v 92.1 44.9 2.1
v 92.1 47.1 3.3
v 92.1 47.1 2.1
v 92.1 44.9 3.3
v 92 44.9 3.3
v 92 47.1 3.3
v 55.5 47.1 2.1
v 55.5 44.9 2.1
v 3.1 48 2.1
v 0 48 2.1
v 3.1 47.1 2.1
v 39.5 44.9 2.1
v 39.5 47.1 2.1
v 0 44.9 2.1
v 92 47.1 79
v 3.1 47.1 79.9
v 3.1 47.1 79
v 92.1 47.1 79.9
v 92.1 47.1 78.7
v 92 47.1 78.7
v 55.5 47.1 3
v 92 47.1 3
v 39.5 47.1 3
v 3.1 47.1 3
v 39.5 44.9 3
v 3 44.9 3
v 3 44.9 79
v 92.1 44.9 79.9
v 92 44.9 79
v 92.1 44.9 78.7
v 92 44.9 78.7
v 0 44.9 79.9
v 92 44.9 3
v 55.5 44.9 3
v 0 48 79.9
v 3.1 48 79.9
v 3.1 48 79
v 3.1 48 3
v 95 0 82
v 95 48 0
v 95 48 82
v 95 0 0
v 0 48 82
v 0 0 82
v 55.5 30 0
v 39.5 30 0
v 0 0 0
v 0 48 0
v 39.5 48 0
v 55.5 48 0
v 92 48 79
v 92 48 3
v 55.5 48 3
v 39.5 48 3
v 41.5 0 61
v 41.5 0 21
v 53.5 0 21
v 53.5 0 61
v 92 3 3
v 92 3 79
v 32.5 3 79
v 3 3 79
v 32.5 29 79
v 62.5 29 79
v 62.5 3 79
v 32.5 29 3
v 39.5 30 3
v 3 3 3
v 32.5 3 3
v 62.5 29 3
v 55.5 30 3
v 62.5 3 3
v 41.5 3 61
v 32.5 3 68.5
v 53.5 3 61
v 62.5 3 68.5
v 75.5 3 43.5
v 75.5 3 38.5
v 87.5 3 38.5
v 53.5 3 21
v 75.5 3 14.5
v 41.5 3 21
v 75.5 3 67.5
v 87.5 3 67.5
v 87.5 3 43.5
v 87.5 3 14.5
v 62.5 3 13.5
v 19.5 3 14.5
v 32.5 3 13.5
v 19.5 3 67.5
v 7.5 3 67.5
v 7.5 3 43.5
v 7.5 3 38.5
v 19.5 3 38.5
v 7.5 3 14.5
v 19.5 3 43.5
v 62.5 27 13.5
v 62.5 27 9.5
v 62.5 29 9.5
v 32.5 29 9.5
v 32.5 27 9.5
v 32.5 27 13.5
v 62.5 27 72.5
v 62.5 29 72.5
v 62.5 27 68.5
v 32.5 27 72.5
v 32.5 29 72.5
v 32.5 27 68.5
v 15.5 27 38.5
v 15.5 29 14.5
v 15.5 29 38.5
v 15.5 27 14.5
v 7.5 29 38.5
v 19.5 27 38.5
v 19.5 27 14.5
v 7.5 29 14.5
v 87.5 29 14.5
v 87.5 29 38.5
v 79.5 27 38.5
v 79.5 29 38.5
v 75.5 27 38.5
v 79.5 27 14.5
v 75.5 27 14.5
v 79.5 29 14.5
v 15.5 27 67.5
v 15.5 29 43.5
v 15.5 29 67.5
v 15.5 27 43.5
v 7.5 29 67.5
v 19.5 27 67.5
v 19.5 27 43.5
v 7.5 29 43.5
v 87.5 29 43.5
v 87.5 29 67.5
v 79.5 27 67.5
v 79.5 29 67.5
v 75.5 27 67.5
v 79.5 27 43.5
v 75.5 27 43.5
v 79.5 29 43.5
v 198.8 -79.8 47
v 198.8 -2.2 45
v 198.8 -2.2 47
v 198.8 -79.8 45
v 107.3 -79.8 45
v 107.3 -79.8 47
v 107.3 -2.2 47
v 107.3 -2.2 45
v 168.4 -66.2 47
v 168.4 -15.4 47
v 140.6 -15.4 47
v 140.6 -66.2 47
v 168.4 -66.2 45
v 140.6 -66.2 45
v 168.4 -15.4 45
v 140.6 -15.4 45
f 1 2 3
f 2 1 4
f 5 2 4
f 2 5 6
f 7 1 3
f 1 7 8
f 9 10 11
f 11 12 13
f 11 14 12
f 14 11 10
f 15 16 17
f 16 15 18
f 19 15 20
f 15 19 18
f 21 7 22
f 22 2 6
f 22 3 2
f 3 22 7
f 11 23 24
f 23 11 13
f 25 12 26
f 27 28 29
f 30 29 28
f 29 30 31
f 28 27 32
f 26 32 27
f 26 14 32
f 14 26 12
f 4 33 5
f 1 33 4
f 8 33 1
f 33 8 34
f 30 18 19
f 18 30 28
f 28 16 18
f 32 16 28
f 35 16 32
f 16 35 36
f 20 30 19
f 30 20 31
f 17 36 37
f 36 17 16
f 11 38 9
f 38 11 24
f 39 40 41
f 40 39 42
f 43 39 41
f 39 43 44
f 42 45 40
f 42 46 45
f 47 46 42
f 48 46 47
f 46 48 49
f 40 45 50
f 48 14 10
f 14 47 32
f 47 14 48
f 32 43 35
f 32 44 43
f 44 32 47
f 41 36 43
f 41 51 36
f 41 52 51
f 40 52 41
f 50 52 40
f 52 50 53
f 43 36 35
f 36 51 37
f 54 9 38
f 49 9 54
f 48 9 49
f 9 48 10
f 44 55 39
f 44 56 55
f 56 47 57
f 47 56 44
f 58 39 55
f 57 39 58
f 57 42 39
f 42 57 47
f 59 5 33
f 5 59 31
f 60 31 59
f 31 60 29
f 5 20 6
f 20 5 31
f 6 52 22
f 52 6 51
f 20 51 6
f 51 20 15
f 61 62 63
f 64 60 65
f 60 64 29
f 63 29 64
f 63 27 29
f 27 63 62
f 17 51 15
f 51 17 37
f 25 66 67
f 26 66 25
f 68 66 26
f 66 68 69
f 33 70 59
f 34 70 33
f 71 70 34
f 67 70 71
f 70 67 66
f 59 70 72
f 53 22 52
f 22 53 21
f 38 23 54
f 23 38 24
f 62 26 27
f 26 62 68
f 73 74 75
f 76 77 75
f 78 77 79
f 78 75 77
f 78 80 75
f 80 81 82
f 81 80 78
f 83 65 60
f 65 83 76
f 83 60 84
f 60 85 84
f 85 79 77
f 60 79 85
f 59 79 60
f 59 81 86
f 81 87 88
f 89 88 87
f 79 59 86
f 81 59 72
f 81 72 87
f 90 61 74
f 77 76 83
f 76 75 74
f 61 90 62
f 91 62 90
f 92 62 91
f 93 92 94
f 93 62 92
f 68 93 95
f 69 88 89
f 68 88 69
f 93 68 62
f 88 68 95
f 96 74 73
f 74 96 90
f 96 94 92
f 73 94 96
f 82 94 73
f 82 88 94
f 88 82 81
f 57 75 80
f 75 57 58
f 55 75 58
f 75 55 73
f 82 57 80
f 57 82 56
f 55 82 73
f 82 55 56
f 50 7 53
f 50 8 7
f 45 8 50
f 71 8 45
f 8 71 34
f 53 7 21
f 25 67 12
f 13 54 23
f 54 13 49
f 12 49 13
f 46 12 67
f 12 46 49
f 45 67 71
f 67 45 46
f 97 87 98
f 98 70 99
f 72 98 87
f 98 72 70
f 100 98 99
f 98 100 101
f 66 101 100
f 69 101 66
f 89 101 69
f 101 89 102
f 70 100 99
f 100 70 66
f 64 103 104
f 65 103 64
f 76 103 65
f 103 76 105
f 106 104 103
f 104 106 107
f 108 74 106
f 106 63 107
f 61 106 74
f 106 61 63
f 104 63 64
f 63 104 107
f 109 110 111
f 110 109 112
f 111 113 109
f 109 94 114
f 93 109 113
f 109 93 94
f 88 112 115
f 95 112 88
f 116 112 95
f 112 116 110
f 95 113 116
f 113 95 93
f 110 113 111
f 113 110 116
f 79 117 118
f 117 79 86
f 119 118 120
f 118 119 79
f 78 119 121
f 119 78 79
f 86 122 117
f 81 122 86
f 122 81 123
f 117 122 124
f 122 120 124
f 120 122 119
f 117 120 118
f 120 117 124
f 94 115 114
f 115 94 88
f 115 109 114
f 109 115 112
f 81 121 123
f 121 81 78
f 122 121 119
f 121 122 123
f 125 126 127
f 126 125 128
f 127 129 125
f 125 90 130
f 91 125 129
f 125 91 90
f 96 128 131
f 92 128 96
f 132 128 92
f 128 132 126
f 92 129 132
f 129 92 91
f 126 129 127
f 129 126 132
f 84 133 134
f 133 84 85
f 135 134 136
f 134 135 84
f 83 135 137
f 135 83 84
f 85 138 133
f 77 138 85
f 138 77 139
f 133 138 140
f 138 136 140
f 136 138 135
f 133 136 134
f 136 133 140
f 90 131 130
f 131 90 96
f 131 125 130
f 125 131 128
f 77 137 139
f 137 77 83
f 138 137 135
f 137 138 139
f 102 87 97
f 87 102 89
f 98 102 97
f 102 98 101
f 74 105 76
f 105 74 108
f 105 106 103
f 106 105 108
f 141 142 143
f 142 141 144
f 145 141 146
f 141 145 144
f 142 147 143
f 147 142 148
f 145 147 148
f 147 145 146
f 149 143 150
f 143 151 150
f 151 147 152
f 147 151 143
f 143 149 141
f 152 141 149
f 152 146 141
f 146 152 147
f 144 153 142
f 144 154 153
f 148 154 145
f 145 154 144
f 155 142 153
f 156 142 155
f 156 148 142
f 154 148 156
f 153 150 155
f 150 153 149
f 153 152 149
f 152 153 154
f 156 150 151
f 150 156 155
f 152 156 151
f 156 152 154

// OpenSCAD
/* Separate electronics housing for the Pinewood U-frame.
   Y=0 is the flat glue face on the rear U-rail; +Y points outward.
   The 12 x 40 mm opening aligns with the cable entry in the mounting plate.
*/
$fn=36;
piece="print_layout"; // base | lid | print_layout | preview

// 95 mm: version for plug connectors and lateral cable space.
// Use 70 mm for silicone-wire-only wiring.
box_width=95;
box_height=82;
box_depth=48;
wall=3;

cable_width=12;
cable_height=40;
// Display is vertical with USB below it: 27 mm wide, 50 mm tall.
display_width=27.8;  // 0.4 mm clearance per side
display_height=50.8;
lid_thickness=2;
slide_clearance=0.25;
guide_depth=1;              // remaining outer lip of the C-groove
lid_fit_clearance=.2;       // extra clearance for PETG sliding fit
// Lid slides from left to right in integrated C-grooves.
lid_x=.2+lid_fit_clearance/2;
lid_width=box_width-wall-lid_x-.1-lid_fit_clearance/2;
lid_y=box_depth-lid_thickness-guide_depth;
lid_z=wall-.9+lid_fit_clearance/2;
lid_height=box_height-2*wall+1.8-lid_fit_clearance;

// Board position: 64 x 63 mm, USB on the lower edge.
board_width=64;
board_height=63;
board_stack=17.8;
board_x=(box_width-board_width)/2;
board_z=9.5;
// The board rear is high enough for terminal blocks below it. The tallest
// assembly has 0.3 mm clearance to the actual lid inner face
// (Y=box_depth-lid_thickness).
board_y=lid_y-board_stack-.3;

// The 50 x 27 mm display is 6.3 mm below the upper board edge.
display_x=board_x+(board_width-display_width)/2;
display_z=board_z+board_height-6.3-display_height;

// Six tall supports with 2 mm stepped seats: an outer rim protrudes 2 mm
// farther and a recessed 2 mm seat supports the board. The board is inserted
// centrally; the lid applies only light pressure. Six gaps remain for cables
// leading to the 12 x 40 mm pass-through.
module board_supports() {
  pad_depth=board_y-wall;
  overlap=4;       // 4 mm wide recessed board support
  seat_step=2;
  side_width=8;
  horizontal_width=30;
  side_height=24;

  // Top/bottom: raised 2 mm outer rim plus recessed support.
  for(z=[board_z-side_width,board_z+board_height]) {
    translate([board_x+(board_width-horizontal_width)/2,wall-.1,z])
      cube([horizontal_width,pad_depth+seat_step+.2,side_width]);
  }
  translate([board_x+(board_width-horizontal_width)/2,wall-.1,board_z])
    cube([horizontal_width,pad_depth+.2,overlap]);
  translate([board_x+(board_width-horizontal_width)/2,wall-.1,board_z+board_height-overlap])
    cube([horizontal_width,pad_depth+.2,overlap]);

  // Left/right: two stepped seats each, free center for cables.
  for(z=[board_z+5,board_z+board_height-side_height-5]) {
    translate([board_x-side_width,wall-.1,z])
      cube([side_width,pad_depth+seat_step+.2,side_height]);
    translate([board_x+board_width,wall-.1,z])
      cube([side_width,pad_depth+seat_step+.2,side_height]);
    translate([board_x,wall-.1,z]) cube([overlap,pad_depth+.2,side_height]);
    translate([board_x+board_width-overlap,wall-.1,z])
      cube([overlap,pad_depth+.2,side_height]);
  }
}

// True C-grooves within the 3 mm housing walls. The lid is 1 mm below the
// outer face and is guided along its top, bottom, and right edges.
module lid_channel_cuts() {
  channel_y=lid_y-.1;
  channel_h=lid_thickness+.2;
  // Lower and upper longitudinal grooves.
  translate([-.1,channel_y,lid_z-.1])
    cube([box_width-wall+.2,channel_h,1.2]);
  translate([-.1,channel_y,lid_z+lid_height-1.1])
    cube([box_width-wall+.2,channel_h,1.2]);
  // Right vertical groove; the solid right wall remains the end stop.
  translate([lid_x+lid_width-1.1,channel_y,lid_z-.1])
    cube([1.2,channel_h,lid_height+.2]);
  // Fully open the left entry: the outer lip on this side would otherwise form
  // a long, fragile bridge over the lid entry. The lid remains guided by the
  // top, bottom, and right C-grooves.
  translate([-.1,channel_y,lid_z-.1])
    cube([wall+.2,box_depth-channel_y+.2,lid_height+.2]);
}

module housing_base() {
  union() {
    difference() {
      cube([box_width,box_depth,box_height]);
      // Open outer side, closed by the lid after assembly.
      translate([wall,wall,wall])
        cube([box_width-2*wall,box_depth-wall+0.1,box_height-2*wall]);
      // Pass-through to the 12 x 40 mm cable entry in the U-frame.
      translate([(box_width-cable_width)/2,-.1,(box_height-cable_height)/2])
        cube([cable_width,wall+.2,cable_height]);
      // USB access from below, centered and open towards the outside.
      translate([box_width/2-8,box_depth-18,-.1]) cube([16,18,wall+.2]);
      lid_channel_cuts();
    }
    board_supports();
  }
}

module housing_lid() {
  difference() {
    // Completely flat rear: print directly on the bed without supports.
    translate([lid_x,lid_y,lid_z])
      cube([lid_width,lid_thickness,lid_height]);
    // Display is visible only from the outside.
    translate([display_x,lid_y-.1,display_z])
      cube([display_width,lid_thickness+2,display_height]);
    // Fingernail recess at the open left insertion side.
    translate([lid_x-.1,lid_y-.1,box_height/2])
      rotate([90,0,0]) cylinder(d=12,h=lid_thickness+2);
  }
}

module print_layout() {
  housing_base();
  translate([box_width+12,0,0]) rotate([90,0,0]) housing_lid();
}

if(piece=="base") housing_base();
if(piece=="lid") housing_lid();
if(piece=="print_layout") print_layout();
if(piece=="preview") { housing_base(); housing_lid(); }
